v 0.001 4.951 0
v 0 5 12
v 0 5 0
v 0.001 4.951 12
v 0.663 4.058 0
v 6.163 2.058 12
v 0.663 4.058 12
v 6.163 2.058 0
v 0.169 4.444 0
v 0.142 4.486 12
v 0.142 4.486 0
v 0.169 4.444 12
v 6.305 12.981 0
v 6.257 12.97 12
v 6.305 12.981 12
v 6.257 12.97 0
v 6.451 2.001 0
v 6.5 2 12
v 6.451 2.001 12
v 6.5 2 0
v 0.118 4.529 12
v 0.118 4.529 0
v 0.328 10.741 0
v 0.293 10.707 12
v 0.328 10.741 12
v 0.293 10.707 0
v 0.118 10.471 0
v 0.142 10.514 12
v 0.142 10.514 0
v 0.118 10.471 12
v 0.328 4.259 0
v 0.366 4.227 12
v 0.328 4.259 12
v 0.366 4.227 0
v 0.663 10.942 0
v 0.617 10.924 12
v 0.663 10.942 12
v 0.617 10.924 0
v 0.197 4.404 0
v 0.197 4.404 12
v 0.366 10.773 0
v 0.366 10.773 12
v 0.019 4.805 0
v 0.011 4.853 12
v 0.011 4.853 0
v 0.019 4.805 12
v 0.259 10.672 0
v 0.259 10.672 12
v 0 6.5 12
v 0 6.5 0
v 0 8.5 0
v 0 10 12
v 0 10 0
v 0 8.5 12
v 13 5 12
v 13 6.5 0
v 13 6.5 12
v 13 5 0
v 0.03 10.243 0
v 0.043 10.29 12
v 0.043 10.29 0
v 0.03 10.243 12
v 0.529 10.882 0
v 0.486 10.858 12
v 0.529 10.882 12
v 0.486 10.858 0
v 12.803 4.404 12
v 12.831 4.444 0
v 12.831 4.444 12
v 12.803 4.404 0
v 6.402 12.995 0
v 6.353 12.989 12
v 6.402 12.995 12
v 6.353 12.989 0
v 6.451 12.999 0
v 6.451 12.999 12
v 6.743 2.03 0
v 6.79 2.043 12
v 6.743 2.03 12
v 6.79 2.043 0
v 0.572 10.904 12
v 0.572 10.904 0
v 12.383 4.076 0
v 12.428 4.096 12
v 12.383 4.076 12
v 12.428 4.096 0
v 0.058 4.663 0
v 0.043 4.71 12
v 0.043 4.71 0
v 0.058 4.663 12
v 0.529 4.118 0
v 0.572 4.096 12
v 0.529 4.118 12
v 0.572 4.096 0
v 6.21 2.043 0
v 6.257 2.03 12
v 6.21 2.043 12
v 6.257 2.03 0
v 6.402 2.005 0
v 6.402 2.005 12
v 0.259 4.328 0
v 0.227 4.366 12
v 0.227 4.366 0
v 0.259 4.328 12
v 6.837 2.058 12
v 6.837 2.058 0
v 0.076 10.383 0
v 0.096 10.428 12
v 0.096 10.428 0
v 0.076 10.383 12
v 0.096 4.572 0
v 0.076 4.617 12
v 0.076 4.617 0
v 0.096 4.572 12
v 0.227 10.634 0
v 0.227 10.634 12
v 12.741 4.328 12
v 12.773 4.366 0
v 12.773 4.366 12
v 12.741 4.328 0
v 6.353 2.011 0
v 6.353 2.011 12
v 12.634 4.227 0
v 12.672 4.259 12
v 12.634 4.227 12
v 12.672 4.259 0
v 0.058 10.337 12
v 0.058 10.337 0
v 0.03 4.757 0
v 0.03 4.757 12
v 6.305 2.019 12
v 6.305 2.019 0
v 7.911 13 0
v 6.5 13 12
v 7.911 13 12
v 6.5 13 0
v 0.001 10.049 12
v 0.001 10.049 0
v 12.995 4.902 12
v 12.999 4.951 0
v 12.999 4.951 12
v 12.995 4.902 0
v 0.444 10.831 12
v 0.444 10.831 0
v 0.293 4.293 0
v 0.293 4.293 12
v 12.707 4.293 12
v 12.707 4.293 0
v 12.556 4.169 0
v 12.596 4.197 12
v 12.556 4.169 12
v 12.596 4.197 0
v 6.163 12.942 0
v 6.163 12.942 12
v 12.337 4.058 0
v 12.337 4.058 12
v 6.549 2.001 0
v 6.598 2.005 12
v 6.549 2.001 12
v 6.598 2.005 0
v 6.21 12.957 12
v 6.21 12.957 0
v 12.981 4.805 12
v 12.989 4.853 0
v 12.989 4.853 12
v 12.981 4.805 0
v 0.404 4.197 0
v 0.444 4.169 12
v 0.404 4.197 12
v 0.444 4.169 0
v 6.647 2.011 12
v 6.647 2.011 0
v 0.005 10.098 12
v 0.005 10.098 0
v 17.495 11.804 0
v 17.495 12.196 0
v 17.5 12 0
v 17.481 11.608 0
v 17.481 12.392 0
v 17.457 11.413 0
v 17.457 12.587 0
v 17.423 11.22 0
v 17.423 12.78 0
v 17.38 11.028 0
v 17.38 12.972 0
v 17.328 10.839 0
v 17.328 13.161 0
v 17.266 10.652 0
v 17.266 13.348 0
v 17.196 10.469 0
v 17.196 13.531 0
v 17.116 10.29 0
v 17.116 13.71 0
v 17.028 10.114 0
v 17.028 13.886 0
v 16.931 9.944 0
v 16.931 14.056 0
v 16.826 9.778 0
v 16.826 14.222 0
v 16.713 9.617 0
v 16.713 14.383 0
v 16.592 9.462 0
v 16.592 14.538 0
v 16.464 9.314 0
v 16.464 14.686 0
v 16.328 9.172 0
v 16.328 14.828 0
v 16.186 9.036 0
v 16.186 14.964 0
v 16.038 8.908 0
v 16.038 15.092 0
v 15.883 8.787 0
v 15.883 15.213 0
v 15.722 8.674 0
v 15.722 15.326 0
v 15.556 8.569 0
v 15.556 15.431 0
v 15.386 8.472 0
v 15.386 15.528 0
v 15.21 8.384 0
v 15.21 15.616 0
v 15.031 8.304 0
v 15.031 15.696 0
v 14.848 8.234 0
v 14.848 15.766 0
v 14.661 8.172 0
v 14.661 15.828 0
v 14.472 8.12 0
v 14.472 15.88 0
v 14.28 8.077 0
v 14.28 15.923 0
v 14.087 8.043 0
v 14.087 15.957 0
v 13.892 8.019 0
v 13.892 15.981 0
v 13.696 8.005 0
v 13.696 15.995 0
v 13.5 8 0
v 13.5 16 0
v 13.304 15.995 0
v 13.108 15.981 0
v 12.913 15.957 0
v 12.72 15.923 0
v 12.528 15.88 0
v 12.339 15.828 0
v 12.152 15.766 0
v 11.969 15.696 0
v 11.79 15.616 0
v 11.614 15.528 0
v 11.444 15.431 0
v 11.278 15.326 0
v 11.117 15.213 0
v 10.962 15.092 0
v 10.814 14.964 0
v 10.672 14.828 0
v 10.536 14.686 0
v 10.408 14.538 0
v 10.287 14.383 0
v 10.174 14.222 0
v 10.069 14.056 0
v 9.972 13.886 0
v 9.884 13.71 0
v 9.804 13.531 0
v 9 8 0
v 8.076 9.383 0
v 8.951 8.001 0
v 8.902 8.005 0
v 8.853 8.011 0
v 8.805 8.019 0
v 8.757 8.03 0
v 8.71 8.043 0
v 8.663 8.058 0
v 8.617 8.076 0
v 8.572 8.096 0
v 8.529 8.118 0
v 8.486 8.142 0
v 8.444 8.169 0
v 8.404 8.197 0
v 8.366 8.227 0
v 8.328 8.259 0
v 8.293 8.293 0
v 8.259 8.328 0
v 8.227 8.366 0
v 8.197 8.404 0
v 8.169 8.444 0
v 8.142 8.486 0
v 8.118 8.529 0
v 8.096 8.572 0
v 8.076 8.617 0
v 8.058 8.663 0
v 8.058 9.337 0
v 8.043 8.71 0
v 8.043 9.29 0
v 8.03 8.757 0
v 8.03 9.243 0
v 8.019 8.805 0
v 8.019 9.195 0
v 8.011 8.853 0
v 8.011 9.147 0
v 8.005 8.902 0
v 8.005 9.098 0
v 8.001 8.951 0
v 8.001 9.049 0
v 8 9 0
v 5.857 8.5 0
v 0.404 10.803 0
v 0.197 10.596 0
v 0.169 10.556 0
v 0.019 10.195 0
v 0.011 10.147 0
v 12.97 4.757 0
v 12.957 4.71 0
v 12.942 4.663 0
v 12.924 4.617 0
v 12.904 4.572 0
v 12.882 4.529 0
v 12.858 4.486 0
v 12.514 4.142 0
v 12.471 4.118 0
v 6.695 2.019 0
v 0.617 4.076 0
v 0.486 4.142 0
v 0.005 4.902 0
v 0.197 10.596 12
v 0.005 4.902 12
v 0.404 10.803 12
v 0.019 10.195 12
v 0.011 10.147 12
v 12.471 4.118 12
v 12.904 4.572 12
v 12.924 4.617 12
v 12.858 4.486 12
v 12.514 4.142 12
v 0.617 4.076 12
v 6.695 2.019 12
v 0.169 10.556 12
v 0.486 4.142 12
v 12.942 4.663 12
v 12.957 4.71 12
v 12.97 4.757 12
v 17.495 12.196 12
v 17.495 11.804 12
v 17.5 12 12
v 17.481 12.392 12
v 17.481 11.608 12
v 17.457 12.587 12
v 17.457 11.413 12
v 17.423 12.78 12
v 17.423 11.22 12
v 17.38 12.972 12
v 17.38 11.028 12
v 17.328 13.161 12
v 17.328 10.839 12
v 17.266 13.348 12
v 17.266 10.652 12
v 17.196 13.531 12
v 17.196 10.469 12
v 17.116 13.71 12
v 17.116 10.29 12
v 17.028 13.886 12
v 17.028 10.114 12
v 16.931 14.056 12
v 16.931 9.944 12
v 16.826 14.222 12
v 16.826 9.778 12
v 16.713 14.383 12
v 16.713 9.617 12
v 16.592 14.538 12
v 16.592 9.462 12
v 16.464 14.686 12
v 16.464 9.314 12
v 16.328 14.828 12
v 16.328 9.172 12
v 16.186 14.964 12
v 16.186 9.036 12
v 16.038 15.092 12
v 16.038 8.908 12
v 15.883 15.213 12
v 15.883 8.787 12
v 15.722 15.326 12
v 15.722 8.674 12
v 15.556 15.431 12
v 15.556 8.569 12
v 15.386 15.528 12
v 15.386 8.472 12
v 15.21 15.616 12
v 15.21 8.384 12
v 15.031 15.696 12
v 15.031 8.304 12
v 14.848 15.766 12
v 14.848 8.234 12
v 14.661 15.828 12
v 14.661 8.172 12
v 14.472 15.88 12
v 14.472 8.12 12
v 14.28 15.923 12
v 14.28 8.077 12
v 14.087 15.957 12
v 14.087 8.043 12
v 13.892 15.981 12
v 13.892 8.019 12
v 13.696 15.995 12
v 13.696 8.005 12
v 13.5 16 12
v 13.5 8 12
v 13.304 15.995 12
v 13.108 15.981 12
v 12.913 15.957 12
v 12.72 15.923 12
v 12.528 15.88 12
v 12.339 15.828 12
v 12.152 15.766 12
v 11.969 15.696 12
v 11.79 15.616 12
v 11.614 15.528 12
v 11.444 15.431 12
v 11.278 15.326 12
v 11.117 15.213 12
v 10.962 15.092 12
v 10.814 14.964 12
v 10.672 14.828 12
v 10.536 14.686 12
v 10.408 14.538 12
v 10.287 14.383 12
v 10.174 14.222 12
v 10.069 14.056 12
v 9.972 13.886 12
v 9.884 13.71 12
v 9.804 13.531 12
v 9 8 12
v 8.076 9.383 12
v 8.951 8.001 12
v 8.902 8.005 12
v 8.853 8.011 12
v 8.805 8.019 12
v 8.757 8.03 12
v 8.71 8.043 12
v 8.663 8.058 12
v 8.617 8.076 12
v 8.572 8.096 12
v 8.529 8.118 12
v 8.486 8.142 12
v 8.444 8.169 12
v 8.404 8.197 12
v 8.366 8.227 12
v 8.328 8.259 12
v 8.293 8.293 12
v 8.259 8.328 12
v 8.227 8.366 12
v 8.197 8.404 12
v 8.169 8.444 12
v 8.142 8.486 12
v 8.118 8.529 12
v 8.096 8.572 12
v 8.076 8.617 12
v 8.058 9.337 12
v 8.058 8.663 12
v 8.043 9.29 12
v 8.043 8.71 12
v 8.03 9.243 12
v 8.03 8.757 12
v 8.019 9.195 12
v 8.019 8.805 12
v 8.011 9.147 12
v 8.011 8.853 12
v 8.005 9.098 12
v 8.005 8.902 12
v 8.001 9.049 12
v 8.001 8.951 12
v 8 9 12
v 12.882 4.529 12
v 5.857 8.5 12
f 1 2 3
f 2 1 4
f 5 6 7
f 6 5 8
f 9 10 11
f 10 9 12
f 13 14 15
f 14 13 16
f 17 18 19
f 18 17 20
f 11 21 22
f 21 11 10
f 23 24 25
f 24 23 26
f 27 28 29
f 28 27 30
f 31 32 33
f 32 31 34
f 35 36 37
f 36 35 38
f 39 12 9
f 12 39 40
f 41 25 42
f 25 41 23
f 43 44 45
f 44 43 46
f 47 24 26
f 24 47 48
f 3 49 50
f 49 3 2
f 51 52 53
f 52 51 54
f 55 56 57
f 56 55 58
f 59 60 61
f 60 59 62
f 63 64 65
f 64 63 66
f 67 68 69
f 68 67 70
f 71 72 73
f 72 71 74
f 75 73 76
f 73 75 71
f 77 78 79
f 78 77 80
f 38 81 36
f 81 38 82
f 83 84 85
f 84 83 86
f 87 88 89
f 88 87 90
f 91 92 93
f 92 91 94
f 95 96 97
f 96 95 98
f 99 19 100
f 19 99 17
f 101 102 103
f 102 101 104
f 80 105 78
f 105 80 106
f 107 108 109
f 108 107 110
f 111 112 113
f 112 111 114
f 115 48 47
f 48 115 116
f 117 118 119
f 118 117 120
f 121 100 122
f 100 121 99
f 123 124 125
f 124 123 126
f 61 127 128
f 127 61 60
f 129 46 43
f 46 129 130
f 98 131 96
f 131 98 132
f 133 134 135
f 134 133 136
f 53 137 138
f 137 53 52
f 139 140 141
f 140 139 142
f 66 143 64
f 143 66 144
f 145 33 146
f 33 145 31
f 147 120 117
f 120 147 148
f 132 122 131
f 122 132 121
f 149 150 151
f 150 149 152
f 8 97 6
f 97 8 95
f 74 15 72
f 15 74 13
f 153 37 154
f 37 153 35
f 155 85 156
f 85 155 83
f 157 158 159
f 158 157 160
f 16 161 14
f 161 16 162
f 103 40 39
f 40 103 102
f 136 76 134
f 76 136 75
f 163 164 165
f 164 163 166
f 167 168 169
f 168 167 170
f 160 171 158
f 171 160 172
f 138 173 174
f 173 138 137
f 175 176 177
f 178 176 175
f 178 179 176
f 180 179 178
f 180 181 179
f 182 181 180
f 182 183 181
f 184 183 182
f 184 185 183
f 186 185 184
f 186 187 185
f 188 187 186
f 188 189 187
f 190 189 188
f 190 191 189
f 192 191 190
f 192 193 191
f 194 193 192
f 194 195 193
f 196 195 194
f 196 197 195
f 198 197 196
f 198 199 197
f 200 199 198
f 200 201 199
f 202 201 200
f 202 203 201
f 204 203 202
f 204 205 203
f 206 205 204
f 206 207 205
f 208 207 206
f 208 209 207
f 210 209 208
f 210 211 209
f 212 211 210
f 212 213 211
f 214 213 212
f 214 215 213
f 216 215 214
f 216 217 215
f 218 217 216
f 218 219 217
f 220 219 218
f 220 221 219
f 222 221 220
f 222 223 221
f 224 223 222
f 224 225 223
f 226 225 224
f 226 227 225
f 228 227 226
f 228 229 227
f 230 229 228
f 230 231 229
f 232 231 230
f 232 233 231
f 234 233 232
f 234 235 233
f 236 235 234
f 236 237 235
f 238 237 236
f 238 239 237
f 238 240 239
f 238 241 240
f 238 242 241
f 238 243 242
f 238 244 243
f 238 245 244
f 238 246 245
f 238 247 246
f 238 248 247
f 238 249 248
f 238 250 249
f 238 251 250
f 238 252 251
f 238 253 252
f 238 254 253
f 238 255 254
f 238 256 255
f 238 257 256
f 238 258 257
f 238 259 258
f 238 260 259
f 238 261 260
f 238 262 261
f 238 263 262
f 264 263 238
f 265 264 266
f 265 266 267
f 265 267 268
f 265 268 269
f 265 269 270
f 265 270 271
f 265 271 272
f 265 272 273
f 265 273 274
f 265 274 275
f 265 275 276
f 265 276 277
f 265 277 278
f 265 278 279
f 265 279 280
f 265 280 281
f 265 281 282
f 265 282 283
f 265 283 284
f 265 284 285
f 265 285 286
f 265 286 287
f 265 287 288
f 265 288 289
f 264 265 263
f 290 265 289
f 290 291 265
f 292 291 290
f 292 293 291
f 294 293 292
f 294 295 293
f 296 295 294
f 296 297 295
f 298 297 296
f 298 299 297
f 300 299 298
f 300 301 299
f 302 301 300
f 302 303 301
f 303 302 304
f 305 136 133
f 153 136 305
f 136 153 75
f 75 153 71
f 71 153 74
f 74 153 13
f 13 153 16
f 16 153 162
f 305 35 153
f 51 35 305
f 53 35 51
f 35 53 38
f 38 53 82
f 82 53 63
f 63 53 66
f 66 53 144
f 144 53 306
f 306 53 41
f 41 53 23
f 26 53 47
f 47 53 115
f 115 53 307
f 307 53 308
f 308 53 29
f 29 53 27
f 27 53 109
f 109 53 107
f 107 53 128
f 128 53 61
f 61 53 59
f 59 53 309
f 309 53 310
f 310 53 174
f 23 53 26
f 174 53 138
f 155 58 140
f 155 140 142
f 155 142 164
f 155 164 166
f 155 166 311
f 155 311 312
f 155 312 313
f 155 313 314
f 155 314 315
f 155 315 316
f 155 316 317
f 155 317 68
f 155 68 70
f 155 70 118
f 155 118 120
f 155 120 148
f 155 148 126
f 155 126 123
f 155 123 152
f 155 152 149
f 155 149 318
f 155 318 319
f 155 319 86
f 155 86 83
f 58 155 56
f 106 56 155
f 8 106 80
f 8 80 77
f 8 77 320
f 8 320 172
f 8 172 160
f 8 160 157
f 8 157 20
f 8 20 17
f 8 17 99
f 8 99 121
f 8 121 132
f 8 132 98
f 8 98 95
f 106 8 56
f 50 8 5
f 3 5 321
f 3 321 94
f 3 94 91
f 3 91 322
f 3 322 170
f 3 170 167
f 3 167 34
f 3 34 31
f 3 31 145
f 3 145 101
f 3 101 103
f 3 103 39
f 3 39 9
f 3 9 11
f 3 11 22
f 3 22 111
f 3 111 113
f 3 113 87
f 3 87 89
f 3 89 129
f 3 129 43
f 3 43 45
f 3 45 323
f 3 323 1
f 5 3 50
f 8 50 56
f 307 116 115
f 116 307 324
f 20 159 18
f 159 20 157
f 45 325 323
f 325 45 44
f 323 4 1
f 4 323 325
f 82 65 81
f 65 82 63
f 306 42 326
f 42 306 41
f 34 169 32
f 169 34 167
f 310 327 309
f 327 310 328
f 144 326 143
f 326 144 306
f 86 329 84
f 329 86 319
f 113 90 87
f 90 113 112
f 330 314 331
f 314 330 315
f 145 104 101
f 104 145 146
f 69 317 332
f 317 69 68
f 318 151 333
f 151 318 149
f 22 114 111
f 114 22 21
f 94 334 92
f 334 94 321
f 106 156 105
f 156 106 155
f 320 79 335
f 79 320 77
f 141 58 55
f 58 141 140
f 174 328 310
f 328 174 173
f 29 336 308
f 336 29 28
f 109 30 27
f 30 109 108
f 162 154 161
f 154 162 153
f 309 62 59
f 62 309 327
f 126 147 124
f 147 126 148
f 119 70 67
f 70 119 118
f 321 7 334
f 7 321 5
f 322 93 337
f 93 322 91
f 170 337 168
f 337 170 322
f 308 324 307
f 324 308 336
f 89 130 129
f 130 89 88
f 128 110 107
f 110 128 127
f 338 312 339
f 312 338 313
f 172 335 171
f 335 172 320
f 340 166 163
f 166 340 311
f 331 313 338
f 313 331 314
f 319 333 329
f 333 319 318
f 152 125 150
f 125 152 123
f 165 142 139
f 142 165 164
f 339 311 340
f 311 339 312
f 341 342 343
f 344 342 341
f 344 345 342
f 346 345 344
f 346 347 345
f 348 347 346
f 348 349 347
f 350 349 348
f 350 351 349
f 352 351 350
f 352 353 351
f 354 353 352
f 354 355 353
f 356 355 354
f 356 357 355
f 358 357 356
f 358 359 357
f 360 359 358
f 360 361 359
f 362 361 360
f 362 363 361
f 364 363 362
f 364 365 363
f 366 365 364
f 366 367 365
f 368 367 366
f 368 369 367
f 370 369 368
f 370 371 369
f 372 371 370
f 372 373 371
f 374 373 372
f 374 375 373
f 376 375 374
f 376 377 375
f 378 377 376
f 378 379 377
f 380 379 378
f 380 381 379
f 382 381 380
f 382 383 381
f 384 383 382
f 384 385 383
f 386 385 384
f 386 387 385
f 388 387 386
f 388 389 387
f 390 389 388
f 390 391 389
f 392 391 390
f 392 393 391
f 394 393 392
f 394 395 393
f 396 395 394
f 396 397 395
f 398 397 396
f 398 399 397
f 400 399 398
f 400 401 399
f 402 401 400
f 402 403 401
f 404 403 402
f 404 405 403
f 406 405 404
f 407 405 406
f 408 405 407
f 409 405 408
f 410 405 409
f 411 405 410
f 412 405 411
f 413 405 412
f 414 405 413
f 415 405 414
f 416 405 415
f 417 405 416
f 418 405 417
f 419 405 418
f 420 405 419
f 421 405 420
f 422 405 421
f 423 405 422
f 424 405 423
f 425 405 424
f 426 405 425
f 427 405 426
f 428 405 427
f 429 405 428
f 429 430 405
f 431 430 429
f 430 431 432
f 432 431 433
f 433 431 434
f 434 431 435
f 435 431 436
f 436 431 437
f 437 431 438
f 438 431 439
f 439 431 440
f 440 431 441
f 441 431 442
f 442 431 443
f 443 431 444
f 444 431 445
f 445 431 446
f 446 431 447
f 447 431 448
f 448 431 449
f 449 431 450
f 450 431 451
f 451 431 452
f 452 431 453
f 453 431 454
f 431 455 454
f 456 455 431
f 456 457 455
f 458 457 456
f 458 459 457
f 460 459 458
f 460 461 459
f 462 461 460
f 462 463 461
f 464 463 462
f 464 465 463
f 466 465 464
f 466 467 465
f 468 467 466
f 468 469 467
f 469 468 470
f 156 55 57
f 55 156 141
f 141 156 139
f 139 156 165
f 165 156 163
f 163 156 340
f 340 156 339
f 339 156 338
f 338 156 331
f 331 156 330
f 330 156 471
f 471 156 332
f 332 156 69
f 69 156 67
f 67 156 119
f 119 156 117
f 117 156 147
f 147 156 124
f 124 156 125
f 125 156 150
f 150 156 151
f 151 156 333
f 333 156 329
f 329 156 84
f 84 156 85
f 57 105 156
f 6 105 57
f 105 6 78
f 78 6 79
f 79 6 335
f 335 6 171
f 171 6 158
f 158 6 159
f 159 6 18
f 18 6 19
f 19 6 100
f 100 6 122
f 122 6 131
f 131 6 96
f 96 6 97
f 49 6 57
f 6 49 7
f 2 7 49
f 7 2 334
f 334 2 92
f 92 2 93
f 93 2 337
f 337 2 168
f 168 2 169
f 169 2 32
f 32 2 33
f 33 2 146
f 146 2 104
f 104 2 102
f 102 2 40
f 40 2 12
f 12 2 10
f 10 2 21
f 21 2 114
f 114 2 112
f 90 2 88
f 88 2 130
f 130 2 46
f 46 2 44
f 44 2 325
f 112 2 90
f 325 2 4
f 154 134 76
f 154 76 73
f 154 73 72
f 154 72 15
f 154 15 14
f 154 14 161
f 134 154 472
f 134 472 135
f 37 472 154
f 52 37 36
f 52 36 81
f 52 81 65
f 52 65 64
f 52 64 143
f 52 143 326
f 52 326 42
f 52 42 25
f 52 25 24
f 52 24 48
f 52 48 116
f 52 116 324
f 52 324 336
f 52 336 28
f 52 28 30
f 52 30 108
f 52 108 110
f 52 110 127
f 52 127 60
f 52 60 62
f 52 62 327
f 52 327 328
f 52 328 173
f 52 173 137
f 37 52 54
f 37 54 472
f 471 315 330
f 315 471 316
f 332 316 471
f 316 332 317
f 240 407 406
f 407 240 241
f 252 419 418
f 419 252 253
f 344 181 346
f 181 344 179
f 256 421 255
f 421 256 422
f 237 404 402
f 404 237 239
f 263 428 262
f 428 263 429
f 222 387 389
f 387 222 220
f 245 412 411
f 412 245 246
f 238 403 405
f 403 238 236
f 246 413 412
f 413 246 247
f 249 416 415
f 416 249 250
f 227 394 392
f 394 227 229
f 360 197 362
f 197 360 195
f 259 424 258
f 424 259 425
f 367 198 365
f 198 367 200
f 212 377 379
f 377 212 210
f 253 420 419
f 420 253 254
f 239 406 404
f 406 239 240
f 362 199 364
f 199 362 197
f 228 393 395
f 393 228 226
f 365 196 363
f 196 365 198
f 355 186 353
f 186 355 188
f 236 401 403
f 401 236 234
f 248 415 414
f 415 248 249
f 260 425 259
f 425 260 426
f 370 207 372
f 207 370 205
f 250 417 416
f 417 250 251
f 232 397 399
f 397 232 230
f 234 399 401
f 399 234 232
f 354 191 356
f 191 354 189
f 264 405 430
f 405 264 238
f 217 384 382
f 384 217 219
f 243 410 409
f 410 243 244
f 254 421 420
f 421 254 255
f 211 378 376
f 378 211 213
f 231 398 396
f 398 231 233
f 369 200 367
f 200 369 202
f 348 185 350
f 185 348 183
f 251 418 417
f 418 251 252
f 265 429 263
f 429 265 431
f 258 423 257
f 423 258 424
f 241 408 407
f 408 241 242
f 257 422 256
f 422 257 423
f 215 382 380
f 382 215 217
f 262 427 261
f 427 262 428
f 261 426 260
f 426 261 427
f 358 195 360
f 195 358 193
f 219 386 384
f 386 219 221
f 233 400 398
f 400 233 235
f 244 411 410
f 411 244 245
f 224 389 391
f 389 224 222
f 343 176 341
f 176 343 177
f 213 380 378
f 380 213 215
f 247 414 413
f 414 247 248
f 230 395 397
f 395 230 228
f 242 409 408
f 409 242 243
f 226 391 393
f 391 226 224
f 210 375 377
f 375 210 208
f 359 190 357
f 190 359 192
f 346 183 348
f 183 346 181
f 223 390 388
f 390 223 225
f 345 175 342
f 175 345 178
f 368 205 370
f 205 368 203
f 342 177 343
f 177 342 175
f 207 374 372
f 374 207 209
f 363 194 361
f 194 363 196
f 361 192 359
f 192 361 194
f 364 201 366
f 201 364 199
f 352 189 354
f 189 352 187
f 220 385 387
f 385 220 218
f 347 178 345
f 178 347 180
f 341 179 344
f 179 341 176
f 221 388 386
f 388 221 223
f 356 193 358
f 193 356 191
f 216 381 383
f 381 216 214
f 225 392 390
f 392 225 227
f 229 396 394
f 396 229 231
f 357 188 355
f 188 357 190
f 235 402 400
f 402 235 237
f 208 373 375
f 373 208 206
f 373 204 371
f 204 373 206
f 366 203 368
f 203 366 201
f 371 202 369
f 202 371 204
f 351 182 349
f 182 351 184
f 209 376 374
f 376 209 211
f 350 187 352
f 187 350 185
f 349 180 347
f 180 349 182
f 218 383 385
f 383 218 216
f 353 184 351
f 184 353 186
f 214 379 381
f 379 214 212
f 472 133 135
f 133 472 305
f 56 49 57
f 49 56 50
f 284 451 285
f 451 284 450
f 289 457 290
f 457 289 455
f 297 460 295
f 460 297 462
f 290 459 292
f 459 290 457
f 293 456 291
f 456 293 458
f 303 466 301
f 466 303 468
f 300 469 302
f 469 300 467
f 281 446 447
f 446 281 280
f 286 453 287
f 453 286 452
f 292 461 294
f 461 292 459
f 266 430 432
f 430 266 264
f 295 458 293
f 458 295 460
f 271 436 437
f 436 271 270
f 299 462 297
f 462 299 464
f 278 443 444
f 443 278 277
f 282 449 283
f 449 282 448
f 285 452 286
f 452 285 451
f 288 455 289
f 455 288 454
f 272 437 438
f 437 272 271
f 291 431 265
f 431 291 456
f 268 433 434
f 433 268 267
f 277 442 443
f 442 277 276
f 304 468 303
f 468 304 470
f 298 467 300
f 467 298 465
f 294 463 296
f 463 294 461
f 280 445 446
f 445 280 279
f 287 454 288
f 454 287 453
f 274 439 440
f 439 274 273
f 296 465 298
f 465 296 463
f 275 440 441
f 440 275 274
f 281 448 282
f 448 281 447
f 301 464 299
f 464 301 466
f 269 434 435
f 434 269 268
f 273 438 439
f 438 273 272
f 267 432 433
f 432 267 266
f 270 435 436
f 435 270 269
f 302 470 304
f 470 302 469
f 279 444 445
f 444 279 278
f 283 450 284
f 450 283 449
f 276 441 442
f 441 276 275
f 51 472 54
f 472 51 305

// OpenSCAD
module belt_clamp(){
    $fn=32 * 4;
    module frame(){
        hull(){
            translate([1,5,0]) cylinder(h = 12, r = 1);
            translate([6.5,3,0]) cylinder(h = 12, r = 1);
            translate([12,5,0]) cylinder(h = 12, r = 1);
            translate([12,12,0]) cylinder(h = 12, r = 1);
            translate([6.5,12,0]) cylinder(h = 12, r = 1);
            translate([1,10,0]) cylinder(h = 12, r = 1);
        }    
    }
    module belt_loop(){
        difference(){
            hull(){
                translate([6.5,1,-1]) cylinder(h = 14, r = 1);
                translate([13.5,5.5,-1]) cylinder(h = 14, r = 5.5);
            }
            belt_loop_hole();
        }
        translate([-1, 0,-1]) cube([8,2,14]);
    }
    
    module belt_loop_hole(){    
        hull(){
            translate([9,2.5,0]) cylinder(h = 12, r = 1);
            translate([13.5,5.5,0]) cylinder(h = 12, r = 4);
        }
    }
    
    
    difference(){
        union() {
            frame();
            translate([0,6.5,0]) belt_loop_hole();
            }
        translate([0,6.5,0]) belt_loop();
        }
}


belt_clamp();
